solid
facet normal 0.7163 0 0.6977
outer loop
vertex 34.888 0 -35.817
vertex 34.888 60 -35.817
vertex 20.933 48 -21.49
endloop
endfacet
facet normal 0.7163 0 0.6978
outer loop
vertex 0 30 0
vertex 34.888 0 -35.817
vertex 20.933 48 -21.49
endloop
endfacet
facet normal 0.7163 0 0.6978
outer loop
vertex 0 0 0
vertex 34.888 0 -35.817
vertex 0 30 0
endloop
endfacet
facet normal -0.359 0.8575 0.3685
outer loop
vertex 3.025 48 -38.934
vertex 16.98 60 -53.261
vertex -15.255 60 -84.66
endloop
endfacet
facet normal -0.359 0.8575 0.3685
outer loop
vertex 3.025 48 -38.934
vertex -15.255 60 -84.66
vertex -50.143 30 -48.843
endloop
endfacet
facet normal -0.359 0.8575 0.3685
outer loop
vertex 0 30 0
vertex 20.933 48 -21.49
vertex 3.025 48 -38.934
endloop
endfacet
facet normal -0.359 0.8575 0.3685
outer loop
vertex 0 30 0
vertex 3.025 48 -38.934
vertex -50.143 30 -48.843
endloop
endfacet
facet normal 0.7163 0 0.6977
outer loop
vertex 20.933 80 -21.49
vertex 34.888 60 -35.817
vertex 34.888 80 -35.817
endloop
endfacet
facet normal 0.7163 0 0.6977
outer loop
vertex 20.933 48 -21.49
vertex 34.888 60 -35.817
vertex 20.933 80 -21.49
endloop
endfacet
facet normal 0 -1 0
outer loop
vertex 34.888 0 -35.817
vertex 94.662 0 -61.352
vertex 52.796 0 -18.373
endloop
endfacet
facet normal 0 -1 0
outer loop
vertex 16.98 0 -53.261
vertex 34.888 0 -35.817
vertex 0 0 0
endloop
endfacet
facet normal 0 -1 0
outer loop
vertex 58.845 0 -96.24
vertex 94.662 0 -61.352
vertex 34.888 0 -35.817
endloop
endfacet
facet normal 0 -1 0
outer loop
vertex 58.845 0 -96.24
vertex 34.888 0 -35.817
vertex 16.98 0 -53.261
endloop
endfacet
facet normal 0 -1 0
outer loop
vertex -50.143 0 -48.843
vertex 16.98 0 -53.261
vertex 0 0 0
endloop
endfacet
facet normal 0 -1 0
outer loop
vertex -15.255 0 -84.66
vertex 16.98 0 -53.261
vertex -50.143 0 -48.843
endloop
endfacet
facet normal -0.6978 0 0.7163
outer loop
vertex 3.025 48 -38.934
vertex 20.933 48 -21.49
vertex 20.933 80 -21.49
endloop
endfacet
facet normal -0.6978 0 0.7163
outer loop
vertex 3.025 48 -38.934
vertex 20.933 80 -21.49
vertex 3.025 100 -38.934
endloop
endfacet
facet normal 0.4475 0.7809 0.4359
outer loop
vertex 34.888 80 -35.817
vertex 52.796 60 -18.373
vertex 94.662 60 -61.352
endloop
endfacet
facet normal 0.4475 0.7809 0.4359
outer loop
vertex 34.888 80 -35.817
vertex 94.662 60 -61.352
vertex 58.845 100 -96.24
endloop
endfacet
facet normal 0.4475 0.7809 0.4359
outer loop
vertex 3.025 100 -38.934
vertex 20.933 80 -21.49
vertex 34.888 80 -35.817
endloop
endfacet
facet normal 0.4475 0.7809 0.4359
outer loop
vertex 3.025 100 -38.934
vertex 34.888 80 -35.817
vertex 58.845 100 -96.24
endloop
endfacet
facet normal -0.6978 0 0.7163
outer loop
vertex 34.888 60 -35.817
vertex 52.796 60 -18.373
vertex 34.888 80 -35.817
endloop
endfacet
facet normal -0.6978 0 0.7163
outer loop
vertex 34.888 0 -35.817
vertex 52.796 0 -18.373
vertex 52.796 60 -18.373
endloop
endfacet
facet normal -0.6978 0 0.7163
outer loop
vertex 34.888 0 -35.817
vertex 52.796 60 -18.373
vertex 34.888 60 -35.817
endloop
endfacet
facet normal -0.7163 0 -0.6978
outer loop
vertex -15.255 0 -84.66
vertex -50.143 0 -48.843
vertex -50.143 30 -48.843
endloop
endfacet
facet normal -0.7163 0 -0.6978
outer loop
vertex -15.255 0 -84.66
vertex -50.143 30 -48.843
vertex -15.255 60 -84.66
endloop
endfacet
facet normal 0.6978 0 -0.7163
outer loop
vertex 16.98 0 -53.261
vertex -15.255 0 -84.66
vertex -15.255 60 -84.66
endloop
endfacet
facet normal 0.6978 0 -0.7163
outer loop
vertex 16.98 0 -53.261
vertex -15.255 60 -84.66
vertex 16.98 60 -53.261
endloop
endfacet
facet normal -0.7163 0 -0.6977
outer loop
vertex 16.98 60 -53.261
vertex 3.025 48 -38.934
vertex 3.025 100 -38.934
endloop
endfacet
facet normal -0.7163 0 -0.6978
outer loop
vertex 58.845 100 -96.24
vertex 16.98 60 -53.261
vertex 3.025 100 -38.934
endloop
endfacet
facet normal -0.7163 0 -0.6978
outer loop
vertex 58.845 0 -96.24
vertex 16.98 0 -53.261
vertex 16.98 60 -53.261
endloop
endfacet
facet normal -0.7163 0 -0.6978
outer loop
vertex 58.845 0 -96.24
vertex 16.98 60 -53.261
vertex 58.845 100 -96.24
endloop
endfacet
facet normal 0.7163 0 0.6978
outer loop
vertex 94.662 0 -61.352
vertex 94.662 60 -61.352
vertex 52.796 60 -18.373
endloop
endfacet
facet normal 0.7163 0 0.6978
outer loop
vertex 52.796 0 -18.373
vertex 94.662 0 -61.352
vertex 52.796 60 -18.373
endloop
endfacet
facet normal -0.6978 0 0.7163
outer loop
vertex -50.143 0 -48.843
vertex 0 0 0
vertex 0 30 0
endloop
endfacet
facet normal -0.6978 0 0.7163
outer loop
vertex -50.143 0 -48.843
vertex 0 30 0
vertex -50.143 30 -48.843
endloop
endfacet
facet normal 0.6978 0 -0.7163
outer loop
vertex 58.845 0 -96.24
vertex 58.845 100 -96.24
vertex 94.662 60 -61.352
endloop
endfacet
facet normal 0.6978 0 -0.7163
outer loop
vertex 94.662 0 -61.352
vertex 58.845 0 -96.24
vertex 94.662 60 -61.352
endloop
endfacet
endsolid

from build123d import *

# Parameters (mm, degrees)
EXTRUDE1_DEPTH = 60
EXTRUDE2_DEPTH = 95.991377429
EXTRUDE3_DEPTH = 100
EXTRUDE4_DEPTH = 100


with BuildPart() as part:
    # Sketch1 → Extrude1 (new body)
    with BuildSketch(Plane(origin=(0, 0, 0), x_dir=(1, 0, 0), z_dir=(0, 1, 0))):
        Polygon((0, 0), (-50.143211133, 48.843201956), (-15.255209736, 84.659781336), (34.888001397, 35.816579381), align=None)
    extrude(amount=EXTRUDE1_DEPTH)

    # Sketch2 → Extrude2 (cut, through all)
    with BuildSketch(Plane(origin=(0, 0, 0), x_dir=(0.697760028, 0, -0.716331588), z_dir=(0.716331588, 0, 0.697760028))):
        Polygon((50, 60), (0, 30), (0, 60), align=None)
    extrude(amount=-EXTRUDE2_DEPTH, mode=Mode.SUBTRACT)

    # Sketch3 → Extrude3 (add)
    with BuildSketch(Plane(origin=(0, 0, 0), x_dir=(1, 0, 0), z_dir=(0, 1, 0))):
        Polygon((20.932800838, 21.489947628), (3.024511148, 38.933948327), (58.845313383, 96.240475336), (94.661892763, 61.352473939), (52.796291087, 18.372578682), (34.888001397, 35.816579381), align=None)
    extrude(amount=EXTRUDE3_DEPTH)

    # Sketch4 → Extrude4 (cut)
    with BuildSketch(Plane(origin=(20.932800838, 0, -21.489947628), x_dir=(0.716331588, 0, 0.697760028), z_dir=(-0.697760028, 0, 0.716331588))):
        Polygon((25, 60), (-25, 100), (25, 100), align=None)
    extrude(amount=-EXTRUDE4_DEPTH, mode=Mode.SUBTRACT)


solid = part.part
